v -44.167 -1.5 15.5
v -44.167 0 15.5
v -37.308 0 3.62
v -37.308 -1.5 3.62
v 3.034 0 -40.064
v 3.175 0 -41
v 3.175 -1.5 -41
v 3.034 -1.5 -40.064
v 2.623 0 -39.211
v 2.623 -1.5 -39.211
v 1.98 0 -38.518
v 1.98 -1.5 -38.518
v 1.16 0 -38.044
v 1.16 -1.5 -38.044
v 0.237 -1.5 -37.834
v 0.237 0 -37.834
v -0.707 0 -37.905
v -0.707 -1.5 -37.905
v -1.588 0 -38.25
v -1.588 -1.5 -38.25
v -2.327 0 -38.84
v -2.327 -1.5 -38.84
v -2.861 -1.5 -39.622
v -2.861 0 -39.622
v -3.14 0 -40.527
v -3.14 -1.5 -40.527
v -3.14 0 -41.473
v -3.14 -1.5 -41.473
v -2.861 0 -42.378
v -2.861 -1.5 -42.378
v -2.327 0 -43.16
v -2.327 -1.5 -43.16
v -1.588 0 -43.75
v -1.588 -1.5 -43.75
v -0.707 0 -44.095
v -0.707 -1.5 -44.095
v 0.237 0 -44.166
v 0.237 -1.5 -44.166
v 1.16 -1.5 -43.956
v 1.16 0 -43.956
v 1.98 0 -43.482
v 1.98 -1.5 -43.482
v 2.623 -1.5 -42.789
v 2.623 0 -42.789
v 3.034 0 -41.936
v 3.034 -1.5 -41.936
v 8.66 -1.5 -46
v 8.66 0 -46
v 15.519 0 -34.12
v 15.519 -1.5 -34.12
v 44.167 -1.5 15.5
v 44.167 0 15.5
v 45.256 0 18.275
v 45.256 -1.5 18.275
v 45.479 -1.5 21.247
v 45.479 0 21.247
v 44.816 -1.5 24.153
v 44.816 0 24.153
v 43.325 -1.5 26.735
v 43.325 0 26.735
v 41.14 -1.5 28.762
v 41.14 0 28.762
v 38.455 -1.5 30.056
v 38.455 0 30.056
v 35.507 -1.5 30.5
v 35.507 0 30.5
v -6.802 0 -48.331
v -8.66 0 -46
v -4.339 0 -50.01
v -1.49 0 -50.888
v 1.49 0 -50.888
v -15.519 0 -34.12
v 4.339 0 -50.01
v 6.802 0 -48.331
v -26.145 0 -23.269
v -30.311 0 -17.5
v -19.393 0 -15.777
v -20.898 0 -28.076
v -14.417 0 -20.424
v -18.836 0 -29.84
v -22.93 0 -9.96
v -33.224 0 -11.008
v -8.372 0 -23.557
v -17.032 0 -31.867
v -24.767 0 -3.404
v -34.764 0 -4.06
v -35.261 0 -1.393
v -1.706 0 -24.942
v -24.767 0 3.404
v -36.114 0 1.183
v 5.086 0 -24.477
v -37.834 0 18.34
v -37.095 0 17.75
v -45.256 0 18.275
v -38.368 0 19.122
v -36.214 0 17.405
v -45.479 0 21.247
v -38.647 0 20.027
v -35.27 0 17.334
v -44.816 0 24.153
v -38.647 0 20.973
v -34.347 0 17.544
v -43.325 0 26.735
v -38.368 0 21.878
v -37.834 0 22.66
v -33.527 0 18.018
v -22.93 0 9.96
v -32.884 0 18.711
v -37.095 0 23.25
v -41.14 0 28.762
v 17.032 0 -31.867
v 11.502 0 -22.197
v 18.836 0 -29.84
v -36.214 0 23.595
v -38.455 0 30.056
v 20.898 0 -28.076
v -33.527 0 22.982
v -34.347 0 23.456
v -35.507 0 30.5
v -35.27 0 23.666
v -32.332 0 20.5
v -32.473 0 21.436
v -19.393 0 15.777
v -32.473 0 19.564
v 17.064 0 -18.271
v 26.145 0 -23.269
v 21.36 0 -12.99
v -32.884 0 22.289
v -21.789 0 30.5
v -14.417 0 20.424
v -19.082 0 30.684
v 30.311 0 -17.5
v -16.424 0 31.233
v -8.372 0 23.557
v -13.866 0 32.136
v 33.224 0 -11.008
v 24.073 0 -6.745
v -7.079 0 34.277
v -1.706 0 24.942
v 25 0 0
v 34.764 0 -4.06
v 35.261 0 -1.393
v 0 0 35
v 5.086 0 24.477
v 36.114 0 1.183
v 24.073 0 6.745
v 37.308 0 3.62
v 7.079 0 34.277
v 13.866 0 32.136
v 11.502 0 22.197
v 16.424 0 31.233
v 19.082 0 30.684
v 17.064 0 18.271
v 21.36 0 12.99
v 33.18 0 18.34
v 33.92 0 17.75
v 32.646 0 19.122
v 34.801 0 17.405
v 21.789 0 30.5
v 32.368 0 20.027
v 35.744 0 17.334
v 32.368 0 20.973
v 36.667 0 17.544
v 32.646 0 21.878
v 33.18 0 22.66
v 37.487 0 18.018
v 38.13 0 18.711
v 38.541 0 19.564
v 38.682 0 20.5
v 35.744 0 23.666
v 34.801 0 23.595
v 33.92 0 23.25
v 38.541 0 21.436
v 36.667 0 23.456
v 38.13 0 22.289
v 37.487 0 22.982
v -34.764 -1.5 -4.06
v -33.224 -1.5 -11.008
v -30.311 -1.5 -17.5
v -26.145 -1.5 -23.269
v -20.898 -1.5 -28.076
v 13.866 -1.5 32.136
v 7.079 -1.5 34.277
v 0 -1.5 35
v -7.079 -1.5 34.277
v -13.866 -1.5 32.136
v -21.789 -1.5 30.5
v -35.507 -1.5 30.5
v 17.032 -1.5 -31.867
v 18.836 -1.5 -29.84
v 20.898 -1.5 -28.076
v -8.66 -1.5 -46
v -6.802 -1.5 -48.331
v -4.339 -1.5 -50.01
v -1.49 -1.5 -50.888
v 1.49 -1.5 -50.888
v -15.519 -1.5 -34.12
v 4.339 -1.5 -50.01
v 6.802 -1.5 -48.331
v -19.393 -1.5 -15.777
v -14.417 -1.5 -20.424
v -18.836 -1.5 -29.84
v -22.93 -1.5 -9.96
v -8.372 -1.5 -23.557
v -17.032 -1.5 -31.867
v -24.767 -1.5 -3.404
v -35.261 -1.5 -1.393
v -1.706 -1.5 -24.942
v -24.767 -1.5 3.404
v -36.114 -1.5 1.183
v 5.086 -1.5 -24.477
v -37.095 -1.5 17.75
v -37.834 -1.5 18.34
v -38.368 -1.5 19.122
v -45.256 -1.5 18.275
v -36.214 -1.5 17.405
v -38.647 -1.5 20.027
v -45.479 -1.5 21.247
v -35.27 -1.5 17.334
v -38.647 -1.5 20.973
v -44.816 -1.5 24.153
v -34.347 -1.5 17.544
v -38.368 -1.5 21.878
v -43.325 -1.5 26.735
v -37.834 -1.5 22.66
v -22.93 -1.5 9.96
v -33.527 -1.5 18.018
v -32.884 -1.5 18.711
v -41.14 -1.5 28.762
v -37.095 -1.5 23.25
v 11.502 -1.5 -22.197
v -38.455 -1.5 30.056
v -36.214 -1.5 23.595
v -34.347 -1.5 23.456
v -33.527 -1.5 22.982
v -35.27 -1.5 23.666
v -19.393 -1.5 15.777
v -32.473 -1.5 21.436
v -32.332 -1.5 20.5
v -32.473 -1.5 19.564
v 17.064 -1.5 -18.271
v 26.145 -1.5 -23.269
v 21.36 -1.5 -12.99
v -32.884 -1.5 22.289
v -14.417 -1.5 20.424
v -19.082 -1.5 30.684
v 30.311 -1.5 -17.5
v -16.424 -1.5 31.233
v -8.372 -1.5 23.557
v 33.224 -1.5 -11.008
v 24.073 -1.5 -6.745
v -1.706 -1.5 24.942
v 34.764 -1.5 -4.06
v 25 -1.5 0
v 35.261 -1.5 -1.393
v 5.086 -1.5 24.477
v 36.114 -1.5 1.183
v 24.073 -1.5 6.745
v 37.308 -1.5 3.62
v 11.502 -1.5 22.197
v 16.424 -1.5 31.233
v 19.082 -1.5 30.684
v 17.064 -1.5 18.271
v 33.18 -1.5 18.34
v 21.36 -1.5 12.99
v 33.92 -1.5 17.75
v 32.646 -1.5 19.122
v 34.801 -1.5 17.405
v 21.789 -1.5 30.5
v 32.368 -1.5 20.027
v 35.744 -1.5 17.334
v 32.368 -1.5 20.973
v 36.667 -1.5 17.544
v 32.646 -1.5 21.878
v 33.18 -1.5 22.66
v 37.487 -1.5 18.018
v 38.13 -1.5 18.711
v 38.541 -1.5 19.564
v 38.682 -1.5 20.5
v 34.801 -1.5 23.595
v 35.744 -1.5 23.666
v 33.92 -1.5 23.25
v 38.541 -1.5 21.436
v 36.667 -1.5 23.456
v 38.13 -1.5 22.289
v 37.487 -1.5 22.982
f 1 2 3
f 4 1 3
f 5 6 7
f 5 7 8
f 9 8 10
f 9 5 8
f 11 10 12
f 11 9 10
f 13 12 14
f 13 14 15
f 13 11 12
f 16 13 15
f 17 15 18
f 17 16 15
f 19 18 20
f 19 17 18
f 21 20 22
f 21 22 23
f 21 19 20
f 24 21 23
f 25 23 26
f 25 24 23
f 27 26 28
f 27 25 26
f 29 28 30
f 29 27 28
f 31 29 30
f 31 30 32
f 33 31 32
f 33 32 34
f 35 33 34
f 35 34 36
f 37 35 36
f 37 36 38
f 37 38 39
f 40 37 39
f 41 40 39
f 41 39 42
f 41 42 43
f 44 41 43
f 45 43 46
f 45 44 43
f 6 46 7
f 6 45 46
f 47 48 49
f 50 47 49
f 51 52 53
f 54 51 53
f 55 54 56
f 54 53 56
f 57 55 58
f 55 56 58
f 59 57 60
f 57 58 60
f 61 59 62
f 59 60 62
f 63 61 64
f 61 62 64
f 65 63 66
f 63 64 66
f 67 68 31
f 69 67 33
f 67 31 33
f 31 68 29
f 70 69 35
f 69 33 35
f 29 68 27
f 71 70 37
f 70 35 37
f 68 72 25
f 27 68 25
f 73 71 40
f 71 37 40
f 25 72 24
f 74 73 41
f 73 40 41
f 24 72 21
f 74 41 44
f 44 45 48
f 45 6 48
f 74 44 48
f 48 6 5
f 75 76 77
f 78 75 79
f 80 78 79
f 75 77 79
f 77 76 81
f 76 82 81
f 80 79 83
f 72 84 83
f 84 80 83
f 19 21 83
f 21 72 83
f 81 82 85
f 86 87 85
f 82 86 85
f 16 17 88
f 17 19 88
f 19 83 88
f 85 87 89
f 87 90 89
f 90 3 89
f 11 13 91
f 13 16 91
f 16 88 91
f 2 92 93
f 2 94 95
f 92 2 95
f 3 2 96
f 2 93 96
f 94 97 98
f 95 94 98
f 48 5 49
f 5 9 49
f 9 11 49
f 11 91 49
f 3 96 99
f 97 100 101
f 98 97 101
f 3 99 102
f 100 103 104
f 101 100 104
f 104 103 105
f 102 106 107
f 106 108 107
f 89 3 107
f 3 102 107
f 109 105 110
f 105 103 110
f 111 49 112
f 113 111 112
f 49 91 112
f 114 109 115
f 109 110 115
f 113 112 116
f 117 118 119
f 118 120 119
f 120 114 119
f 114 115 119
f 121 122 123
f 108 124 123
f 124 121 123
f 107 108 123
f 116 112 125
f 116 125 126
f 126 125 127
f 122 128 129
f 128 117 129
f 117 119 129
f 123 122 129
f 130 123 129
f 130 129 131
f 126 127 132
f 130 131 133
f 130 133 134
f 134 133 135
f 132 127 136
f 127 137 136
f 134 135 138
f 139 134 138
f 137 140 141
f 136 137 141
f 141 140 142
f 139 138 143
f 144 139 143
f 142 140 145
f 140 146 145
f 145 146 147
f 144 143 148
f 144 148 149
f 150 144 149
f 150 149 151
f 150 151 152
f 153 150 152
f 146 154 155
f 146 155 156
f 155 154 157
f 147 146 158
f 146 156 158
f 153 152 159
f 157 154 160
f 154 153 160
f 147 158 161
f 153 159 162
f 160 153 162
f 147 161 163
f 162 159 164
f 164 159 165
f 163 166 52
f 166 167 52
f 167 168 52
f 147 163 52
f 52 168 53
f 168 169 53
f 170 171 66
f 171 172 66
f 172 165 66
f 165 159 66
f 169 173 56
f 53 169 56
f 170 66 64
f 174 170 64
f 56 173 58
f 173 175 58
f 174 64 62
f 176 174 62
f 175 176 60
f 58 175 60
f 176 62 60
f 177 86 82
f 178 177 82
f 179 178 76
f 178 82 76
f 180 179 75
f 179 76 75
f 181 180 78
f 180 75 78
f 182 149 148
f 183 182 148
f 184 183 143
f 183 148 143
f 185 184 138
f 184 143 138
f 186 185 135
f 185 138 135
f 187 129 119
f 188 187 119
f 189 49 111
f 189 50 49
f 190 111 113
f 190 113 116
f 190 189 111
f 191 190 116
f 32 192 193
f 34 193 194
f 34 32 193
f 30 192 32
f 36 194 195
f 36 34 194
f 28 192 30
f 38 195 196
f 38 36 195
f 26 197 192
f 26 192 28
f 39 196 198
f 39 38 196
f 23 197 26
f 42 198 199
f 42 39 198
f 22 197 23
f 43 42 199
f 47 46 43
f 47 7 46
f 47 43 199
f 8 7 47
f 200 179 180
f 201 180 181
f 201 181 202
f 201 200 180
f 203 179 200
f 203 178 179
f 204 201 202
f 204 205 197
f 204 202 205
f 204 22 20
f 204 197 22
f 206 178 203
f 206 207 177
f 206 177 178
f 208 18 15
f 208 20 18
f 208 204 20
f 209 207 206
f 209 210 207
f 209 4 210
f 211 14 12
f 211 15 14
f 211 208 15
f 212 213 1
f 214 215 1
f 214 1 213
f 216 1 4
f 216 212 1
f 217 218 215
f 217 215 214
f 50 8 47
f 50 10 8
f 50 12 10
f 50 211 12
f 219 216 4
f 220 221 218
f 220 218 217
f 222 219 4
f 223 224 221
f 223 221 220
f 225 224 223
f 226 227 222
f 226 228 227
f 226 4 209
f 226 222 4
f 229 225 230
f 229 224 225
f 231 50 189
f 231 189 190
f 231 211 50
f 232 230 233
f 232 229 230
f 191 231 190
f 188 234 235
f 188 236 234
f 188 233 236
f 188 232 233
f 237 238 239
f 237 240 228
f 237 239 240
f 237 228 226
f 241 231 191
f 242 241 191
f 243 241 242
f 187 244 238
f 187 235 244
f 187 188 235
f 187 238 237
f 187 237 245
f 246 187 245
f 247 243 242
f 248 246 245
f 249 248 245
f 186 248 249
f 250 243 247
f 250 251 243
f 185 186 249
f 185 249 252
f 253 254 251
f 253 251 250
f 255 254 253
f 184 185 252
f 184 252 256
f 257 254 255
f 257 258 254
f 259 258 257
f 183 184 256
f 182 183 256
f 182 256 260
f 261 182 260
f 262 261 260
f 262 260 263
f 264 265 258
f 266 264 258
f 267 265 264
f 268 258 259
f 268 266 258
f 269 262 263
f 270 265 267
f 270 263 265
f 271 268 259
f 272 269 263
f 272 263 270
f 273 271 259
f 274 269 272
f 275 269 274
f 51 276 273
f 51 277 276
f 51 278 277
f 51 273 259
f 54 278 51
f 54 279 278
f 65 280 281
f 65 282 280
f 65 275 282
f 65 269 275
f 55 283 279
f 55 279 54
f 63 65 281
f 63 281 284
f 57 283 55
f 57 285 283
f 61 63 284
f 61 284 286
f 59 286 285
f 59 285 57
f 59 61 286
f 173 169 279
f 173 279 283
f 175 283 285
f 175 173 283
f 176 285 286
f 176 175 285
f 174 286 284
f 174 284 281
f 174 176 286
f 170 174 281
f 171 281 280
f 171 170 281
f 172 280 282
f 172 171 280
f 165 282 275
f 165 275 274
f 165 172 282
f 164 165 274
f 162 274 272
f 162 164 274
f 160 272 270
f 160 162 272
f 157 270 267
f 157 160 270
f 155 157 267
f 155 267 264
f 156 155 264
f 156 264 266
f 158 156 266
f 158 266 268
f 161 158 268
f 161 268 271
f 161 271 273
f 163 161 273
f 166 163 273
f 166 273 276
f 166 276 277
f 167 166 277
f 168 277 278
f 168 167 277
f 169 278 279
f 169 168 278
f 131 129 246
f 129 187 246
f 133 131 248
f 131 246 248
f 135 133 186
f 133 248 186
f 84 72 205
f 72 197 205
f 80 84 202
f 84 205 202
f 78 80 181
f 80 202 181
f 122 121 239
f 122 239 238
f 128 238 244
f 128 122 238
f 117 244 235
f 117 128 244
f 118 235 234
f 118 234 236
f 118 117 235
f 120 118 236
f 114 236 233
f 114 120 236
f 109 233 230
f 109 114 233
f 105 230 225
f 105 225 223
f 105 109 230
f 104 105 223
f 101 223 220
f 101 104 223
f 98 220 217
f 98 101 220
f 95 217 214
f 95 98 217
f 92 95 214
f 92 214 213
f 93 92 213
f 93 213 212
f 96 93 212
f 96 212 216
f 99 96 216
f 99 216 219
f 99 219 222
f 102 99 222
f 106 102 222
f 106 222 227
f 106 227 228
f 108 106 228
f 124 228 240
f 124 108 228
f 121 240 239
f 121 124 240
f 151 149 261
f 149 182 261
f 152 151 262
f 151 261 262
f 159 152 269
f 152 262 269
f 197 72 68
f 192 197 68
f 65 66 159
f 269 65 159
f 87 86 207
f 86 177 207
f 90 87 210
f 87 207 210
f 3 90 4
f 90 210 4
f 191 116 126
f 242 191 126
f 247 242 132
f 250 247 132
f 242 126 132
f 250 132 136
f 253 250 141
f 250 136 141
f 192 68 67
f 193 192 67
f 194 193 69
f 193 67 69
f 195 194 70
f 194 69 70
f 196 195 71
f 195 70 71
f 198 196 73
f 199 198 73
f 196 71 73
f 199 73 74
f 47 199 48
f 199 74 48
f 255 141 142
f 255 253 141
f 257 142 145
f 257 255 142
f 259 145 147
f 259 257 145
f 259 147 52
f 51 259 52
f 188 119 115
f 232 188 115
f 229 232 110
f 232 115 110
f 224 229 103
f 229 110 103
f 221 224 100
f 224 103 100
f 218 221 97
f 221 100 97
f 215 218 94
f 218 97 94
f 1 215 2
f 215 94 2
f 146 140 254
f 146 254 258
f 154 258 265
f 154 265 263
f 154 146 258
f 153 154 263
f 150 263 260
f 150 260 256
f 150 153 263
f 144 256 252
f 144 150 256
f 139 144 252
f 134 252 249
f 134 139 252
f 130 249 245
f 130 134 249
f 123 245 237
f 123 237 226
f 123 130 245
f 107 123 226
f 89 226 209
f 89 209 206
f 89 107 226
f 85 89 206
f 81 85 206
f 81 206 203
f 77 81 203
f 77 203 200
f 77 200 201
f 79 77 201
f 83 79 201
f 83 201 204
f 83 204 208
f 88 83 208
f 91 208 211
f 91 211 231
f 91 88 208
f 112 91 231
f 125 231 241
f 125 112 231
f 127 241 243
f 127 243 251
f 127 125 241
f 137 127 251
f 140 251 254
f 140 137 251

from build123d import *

# Parameters (mm, degrees)
F0_R     = 3.175
F0_R_2   = 25
F1_DEPTH = 1.5
F2_R     = 20


with BuildPart() as f1:
    # F0 (on Front) → F1 (new body)
    with BuildSketch(Plane.XZ):
        with BuildLine():
            Line((-17.829632, -30.118171), (-8.660254, -46))
            ThreePointArc((-8.660254, -46), (0, -51), (8.660254, -46))
            Line((8.660254, -46), (17.829632, -30.118171))
            ThreePointArc((17.829632, -30.118171), (30.310889, -17.5), (34.997917, -0.381829))
            Line((34.997917, -0.381829), (44.167296, 15.5))
            ThreePointArc((44.167296, 15.5), (44.167296, 25.5), (35.507042, 30.5))
            Line((35.507042, 30.5), (17.168285, 30.5))
            ThreePointArc((17.168285, 30.5), (0, 35), (-17.168285, 30.5))
            Line((-17.168285, 30.5), (-35.507042, 30.5))
            ThreePointArc((-35.507042, 30.5), (-44.167296, 25.5), (-44.167296, 15.5))
            Line((-44.167296, 15.5), (-34.997917, -0.381829))
            ThreePointArc((-34.997917, -0.381829), (-30.310889, -17.5), (-17.829632, -30.118171))
        make_face()
        with Locations((0, -41)):
            Circle(F0_R, mode=Mode.SUBTRACT)
        with Locations((-35.507042, 20.5)):
            Circle(F0_R, mode=Mode.SUBTRACT)
        Circle(F0_R_2, mode=Mode.SUBTRACT)
        with Locations((35.507042, 20.5)):
            Circle(F0_R, mode=Mode.SUBTRACT)
    extrude(amount=F1_DEPTH)

    # F2
    f2_edges = [f1.edges().sort_by_distance(p)[0] for p in [
        (34.997917, -0.75, -0.381829),
        (17.168285, -0.75, 30.5),
        (-17.168285, -0.75, 30.5),
        (-34.997917, -0.75, -0.381829),
        (-17.829632, -0.75, -30.118171),
        (17.829632, -0.75, -30.118171),
    ]]
    fillet(f2_edges, radius=F2_R)


solid = f1.part
